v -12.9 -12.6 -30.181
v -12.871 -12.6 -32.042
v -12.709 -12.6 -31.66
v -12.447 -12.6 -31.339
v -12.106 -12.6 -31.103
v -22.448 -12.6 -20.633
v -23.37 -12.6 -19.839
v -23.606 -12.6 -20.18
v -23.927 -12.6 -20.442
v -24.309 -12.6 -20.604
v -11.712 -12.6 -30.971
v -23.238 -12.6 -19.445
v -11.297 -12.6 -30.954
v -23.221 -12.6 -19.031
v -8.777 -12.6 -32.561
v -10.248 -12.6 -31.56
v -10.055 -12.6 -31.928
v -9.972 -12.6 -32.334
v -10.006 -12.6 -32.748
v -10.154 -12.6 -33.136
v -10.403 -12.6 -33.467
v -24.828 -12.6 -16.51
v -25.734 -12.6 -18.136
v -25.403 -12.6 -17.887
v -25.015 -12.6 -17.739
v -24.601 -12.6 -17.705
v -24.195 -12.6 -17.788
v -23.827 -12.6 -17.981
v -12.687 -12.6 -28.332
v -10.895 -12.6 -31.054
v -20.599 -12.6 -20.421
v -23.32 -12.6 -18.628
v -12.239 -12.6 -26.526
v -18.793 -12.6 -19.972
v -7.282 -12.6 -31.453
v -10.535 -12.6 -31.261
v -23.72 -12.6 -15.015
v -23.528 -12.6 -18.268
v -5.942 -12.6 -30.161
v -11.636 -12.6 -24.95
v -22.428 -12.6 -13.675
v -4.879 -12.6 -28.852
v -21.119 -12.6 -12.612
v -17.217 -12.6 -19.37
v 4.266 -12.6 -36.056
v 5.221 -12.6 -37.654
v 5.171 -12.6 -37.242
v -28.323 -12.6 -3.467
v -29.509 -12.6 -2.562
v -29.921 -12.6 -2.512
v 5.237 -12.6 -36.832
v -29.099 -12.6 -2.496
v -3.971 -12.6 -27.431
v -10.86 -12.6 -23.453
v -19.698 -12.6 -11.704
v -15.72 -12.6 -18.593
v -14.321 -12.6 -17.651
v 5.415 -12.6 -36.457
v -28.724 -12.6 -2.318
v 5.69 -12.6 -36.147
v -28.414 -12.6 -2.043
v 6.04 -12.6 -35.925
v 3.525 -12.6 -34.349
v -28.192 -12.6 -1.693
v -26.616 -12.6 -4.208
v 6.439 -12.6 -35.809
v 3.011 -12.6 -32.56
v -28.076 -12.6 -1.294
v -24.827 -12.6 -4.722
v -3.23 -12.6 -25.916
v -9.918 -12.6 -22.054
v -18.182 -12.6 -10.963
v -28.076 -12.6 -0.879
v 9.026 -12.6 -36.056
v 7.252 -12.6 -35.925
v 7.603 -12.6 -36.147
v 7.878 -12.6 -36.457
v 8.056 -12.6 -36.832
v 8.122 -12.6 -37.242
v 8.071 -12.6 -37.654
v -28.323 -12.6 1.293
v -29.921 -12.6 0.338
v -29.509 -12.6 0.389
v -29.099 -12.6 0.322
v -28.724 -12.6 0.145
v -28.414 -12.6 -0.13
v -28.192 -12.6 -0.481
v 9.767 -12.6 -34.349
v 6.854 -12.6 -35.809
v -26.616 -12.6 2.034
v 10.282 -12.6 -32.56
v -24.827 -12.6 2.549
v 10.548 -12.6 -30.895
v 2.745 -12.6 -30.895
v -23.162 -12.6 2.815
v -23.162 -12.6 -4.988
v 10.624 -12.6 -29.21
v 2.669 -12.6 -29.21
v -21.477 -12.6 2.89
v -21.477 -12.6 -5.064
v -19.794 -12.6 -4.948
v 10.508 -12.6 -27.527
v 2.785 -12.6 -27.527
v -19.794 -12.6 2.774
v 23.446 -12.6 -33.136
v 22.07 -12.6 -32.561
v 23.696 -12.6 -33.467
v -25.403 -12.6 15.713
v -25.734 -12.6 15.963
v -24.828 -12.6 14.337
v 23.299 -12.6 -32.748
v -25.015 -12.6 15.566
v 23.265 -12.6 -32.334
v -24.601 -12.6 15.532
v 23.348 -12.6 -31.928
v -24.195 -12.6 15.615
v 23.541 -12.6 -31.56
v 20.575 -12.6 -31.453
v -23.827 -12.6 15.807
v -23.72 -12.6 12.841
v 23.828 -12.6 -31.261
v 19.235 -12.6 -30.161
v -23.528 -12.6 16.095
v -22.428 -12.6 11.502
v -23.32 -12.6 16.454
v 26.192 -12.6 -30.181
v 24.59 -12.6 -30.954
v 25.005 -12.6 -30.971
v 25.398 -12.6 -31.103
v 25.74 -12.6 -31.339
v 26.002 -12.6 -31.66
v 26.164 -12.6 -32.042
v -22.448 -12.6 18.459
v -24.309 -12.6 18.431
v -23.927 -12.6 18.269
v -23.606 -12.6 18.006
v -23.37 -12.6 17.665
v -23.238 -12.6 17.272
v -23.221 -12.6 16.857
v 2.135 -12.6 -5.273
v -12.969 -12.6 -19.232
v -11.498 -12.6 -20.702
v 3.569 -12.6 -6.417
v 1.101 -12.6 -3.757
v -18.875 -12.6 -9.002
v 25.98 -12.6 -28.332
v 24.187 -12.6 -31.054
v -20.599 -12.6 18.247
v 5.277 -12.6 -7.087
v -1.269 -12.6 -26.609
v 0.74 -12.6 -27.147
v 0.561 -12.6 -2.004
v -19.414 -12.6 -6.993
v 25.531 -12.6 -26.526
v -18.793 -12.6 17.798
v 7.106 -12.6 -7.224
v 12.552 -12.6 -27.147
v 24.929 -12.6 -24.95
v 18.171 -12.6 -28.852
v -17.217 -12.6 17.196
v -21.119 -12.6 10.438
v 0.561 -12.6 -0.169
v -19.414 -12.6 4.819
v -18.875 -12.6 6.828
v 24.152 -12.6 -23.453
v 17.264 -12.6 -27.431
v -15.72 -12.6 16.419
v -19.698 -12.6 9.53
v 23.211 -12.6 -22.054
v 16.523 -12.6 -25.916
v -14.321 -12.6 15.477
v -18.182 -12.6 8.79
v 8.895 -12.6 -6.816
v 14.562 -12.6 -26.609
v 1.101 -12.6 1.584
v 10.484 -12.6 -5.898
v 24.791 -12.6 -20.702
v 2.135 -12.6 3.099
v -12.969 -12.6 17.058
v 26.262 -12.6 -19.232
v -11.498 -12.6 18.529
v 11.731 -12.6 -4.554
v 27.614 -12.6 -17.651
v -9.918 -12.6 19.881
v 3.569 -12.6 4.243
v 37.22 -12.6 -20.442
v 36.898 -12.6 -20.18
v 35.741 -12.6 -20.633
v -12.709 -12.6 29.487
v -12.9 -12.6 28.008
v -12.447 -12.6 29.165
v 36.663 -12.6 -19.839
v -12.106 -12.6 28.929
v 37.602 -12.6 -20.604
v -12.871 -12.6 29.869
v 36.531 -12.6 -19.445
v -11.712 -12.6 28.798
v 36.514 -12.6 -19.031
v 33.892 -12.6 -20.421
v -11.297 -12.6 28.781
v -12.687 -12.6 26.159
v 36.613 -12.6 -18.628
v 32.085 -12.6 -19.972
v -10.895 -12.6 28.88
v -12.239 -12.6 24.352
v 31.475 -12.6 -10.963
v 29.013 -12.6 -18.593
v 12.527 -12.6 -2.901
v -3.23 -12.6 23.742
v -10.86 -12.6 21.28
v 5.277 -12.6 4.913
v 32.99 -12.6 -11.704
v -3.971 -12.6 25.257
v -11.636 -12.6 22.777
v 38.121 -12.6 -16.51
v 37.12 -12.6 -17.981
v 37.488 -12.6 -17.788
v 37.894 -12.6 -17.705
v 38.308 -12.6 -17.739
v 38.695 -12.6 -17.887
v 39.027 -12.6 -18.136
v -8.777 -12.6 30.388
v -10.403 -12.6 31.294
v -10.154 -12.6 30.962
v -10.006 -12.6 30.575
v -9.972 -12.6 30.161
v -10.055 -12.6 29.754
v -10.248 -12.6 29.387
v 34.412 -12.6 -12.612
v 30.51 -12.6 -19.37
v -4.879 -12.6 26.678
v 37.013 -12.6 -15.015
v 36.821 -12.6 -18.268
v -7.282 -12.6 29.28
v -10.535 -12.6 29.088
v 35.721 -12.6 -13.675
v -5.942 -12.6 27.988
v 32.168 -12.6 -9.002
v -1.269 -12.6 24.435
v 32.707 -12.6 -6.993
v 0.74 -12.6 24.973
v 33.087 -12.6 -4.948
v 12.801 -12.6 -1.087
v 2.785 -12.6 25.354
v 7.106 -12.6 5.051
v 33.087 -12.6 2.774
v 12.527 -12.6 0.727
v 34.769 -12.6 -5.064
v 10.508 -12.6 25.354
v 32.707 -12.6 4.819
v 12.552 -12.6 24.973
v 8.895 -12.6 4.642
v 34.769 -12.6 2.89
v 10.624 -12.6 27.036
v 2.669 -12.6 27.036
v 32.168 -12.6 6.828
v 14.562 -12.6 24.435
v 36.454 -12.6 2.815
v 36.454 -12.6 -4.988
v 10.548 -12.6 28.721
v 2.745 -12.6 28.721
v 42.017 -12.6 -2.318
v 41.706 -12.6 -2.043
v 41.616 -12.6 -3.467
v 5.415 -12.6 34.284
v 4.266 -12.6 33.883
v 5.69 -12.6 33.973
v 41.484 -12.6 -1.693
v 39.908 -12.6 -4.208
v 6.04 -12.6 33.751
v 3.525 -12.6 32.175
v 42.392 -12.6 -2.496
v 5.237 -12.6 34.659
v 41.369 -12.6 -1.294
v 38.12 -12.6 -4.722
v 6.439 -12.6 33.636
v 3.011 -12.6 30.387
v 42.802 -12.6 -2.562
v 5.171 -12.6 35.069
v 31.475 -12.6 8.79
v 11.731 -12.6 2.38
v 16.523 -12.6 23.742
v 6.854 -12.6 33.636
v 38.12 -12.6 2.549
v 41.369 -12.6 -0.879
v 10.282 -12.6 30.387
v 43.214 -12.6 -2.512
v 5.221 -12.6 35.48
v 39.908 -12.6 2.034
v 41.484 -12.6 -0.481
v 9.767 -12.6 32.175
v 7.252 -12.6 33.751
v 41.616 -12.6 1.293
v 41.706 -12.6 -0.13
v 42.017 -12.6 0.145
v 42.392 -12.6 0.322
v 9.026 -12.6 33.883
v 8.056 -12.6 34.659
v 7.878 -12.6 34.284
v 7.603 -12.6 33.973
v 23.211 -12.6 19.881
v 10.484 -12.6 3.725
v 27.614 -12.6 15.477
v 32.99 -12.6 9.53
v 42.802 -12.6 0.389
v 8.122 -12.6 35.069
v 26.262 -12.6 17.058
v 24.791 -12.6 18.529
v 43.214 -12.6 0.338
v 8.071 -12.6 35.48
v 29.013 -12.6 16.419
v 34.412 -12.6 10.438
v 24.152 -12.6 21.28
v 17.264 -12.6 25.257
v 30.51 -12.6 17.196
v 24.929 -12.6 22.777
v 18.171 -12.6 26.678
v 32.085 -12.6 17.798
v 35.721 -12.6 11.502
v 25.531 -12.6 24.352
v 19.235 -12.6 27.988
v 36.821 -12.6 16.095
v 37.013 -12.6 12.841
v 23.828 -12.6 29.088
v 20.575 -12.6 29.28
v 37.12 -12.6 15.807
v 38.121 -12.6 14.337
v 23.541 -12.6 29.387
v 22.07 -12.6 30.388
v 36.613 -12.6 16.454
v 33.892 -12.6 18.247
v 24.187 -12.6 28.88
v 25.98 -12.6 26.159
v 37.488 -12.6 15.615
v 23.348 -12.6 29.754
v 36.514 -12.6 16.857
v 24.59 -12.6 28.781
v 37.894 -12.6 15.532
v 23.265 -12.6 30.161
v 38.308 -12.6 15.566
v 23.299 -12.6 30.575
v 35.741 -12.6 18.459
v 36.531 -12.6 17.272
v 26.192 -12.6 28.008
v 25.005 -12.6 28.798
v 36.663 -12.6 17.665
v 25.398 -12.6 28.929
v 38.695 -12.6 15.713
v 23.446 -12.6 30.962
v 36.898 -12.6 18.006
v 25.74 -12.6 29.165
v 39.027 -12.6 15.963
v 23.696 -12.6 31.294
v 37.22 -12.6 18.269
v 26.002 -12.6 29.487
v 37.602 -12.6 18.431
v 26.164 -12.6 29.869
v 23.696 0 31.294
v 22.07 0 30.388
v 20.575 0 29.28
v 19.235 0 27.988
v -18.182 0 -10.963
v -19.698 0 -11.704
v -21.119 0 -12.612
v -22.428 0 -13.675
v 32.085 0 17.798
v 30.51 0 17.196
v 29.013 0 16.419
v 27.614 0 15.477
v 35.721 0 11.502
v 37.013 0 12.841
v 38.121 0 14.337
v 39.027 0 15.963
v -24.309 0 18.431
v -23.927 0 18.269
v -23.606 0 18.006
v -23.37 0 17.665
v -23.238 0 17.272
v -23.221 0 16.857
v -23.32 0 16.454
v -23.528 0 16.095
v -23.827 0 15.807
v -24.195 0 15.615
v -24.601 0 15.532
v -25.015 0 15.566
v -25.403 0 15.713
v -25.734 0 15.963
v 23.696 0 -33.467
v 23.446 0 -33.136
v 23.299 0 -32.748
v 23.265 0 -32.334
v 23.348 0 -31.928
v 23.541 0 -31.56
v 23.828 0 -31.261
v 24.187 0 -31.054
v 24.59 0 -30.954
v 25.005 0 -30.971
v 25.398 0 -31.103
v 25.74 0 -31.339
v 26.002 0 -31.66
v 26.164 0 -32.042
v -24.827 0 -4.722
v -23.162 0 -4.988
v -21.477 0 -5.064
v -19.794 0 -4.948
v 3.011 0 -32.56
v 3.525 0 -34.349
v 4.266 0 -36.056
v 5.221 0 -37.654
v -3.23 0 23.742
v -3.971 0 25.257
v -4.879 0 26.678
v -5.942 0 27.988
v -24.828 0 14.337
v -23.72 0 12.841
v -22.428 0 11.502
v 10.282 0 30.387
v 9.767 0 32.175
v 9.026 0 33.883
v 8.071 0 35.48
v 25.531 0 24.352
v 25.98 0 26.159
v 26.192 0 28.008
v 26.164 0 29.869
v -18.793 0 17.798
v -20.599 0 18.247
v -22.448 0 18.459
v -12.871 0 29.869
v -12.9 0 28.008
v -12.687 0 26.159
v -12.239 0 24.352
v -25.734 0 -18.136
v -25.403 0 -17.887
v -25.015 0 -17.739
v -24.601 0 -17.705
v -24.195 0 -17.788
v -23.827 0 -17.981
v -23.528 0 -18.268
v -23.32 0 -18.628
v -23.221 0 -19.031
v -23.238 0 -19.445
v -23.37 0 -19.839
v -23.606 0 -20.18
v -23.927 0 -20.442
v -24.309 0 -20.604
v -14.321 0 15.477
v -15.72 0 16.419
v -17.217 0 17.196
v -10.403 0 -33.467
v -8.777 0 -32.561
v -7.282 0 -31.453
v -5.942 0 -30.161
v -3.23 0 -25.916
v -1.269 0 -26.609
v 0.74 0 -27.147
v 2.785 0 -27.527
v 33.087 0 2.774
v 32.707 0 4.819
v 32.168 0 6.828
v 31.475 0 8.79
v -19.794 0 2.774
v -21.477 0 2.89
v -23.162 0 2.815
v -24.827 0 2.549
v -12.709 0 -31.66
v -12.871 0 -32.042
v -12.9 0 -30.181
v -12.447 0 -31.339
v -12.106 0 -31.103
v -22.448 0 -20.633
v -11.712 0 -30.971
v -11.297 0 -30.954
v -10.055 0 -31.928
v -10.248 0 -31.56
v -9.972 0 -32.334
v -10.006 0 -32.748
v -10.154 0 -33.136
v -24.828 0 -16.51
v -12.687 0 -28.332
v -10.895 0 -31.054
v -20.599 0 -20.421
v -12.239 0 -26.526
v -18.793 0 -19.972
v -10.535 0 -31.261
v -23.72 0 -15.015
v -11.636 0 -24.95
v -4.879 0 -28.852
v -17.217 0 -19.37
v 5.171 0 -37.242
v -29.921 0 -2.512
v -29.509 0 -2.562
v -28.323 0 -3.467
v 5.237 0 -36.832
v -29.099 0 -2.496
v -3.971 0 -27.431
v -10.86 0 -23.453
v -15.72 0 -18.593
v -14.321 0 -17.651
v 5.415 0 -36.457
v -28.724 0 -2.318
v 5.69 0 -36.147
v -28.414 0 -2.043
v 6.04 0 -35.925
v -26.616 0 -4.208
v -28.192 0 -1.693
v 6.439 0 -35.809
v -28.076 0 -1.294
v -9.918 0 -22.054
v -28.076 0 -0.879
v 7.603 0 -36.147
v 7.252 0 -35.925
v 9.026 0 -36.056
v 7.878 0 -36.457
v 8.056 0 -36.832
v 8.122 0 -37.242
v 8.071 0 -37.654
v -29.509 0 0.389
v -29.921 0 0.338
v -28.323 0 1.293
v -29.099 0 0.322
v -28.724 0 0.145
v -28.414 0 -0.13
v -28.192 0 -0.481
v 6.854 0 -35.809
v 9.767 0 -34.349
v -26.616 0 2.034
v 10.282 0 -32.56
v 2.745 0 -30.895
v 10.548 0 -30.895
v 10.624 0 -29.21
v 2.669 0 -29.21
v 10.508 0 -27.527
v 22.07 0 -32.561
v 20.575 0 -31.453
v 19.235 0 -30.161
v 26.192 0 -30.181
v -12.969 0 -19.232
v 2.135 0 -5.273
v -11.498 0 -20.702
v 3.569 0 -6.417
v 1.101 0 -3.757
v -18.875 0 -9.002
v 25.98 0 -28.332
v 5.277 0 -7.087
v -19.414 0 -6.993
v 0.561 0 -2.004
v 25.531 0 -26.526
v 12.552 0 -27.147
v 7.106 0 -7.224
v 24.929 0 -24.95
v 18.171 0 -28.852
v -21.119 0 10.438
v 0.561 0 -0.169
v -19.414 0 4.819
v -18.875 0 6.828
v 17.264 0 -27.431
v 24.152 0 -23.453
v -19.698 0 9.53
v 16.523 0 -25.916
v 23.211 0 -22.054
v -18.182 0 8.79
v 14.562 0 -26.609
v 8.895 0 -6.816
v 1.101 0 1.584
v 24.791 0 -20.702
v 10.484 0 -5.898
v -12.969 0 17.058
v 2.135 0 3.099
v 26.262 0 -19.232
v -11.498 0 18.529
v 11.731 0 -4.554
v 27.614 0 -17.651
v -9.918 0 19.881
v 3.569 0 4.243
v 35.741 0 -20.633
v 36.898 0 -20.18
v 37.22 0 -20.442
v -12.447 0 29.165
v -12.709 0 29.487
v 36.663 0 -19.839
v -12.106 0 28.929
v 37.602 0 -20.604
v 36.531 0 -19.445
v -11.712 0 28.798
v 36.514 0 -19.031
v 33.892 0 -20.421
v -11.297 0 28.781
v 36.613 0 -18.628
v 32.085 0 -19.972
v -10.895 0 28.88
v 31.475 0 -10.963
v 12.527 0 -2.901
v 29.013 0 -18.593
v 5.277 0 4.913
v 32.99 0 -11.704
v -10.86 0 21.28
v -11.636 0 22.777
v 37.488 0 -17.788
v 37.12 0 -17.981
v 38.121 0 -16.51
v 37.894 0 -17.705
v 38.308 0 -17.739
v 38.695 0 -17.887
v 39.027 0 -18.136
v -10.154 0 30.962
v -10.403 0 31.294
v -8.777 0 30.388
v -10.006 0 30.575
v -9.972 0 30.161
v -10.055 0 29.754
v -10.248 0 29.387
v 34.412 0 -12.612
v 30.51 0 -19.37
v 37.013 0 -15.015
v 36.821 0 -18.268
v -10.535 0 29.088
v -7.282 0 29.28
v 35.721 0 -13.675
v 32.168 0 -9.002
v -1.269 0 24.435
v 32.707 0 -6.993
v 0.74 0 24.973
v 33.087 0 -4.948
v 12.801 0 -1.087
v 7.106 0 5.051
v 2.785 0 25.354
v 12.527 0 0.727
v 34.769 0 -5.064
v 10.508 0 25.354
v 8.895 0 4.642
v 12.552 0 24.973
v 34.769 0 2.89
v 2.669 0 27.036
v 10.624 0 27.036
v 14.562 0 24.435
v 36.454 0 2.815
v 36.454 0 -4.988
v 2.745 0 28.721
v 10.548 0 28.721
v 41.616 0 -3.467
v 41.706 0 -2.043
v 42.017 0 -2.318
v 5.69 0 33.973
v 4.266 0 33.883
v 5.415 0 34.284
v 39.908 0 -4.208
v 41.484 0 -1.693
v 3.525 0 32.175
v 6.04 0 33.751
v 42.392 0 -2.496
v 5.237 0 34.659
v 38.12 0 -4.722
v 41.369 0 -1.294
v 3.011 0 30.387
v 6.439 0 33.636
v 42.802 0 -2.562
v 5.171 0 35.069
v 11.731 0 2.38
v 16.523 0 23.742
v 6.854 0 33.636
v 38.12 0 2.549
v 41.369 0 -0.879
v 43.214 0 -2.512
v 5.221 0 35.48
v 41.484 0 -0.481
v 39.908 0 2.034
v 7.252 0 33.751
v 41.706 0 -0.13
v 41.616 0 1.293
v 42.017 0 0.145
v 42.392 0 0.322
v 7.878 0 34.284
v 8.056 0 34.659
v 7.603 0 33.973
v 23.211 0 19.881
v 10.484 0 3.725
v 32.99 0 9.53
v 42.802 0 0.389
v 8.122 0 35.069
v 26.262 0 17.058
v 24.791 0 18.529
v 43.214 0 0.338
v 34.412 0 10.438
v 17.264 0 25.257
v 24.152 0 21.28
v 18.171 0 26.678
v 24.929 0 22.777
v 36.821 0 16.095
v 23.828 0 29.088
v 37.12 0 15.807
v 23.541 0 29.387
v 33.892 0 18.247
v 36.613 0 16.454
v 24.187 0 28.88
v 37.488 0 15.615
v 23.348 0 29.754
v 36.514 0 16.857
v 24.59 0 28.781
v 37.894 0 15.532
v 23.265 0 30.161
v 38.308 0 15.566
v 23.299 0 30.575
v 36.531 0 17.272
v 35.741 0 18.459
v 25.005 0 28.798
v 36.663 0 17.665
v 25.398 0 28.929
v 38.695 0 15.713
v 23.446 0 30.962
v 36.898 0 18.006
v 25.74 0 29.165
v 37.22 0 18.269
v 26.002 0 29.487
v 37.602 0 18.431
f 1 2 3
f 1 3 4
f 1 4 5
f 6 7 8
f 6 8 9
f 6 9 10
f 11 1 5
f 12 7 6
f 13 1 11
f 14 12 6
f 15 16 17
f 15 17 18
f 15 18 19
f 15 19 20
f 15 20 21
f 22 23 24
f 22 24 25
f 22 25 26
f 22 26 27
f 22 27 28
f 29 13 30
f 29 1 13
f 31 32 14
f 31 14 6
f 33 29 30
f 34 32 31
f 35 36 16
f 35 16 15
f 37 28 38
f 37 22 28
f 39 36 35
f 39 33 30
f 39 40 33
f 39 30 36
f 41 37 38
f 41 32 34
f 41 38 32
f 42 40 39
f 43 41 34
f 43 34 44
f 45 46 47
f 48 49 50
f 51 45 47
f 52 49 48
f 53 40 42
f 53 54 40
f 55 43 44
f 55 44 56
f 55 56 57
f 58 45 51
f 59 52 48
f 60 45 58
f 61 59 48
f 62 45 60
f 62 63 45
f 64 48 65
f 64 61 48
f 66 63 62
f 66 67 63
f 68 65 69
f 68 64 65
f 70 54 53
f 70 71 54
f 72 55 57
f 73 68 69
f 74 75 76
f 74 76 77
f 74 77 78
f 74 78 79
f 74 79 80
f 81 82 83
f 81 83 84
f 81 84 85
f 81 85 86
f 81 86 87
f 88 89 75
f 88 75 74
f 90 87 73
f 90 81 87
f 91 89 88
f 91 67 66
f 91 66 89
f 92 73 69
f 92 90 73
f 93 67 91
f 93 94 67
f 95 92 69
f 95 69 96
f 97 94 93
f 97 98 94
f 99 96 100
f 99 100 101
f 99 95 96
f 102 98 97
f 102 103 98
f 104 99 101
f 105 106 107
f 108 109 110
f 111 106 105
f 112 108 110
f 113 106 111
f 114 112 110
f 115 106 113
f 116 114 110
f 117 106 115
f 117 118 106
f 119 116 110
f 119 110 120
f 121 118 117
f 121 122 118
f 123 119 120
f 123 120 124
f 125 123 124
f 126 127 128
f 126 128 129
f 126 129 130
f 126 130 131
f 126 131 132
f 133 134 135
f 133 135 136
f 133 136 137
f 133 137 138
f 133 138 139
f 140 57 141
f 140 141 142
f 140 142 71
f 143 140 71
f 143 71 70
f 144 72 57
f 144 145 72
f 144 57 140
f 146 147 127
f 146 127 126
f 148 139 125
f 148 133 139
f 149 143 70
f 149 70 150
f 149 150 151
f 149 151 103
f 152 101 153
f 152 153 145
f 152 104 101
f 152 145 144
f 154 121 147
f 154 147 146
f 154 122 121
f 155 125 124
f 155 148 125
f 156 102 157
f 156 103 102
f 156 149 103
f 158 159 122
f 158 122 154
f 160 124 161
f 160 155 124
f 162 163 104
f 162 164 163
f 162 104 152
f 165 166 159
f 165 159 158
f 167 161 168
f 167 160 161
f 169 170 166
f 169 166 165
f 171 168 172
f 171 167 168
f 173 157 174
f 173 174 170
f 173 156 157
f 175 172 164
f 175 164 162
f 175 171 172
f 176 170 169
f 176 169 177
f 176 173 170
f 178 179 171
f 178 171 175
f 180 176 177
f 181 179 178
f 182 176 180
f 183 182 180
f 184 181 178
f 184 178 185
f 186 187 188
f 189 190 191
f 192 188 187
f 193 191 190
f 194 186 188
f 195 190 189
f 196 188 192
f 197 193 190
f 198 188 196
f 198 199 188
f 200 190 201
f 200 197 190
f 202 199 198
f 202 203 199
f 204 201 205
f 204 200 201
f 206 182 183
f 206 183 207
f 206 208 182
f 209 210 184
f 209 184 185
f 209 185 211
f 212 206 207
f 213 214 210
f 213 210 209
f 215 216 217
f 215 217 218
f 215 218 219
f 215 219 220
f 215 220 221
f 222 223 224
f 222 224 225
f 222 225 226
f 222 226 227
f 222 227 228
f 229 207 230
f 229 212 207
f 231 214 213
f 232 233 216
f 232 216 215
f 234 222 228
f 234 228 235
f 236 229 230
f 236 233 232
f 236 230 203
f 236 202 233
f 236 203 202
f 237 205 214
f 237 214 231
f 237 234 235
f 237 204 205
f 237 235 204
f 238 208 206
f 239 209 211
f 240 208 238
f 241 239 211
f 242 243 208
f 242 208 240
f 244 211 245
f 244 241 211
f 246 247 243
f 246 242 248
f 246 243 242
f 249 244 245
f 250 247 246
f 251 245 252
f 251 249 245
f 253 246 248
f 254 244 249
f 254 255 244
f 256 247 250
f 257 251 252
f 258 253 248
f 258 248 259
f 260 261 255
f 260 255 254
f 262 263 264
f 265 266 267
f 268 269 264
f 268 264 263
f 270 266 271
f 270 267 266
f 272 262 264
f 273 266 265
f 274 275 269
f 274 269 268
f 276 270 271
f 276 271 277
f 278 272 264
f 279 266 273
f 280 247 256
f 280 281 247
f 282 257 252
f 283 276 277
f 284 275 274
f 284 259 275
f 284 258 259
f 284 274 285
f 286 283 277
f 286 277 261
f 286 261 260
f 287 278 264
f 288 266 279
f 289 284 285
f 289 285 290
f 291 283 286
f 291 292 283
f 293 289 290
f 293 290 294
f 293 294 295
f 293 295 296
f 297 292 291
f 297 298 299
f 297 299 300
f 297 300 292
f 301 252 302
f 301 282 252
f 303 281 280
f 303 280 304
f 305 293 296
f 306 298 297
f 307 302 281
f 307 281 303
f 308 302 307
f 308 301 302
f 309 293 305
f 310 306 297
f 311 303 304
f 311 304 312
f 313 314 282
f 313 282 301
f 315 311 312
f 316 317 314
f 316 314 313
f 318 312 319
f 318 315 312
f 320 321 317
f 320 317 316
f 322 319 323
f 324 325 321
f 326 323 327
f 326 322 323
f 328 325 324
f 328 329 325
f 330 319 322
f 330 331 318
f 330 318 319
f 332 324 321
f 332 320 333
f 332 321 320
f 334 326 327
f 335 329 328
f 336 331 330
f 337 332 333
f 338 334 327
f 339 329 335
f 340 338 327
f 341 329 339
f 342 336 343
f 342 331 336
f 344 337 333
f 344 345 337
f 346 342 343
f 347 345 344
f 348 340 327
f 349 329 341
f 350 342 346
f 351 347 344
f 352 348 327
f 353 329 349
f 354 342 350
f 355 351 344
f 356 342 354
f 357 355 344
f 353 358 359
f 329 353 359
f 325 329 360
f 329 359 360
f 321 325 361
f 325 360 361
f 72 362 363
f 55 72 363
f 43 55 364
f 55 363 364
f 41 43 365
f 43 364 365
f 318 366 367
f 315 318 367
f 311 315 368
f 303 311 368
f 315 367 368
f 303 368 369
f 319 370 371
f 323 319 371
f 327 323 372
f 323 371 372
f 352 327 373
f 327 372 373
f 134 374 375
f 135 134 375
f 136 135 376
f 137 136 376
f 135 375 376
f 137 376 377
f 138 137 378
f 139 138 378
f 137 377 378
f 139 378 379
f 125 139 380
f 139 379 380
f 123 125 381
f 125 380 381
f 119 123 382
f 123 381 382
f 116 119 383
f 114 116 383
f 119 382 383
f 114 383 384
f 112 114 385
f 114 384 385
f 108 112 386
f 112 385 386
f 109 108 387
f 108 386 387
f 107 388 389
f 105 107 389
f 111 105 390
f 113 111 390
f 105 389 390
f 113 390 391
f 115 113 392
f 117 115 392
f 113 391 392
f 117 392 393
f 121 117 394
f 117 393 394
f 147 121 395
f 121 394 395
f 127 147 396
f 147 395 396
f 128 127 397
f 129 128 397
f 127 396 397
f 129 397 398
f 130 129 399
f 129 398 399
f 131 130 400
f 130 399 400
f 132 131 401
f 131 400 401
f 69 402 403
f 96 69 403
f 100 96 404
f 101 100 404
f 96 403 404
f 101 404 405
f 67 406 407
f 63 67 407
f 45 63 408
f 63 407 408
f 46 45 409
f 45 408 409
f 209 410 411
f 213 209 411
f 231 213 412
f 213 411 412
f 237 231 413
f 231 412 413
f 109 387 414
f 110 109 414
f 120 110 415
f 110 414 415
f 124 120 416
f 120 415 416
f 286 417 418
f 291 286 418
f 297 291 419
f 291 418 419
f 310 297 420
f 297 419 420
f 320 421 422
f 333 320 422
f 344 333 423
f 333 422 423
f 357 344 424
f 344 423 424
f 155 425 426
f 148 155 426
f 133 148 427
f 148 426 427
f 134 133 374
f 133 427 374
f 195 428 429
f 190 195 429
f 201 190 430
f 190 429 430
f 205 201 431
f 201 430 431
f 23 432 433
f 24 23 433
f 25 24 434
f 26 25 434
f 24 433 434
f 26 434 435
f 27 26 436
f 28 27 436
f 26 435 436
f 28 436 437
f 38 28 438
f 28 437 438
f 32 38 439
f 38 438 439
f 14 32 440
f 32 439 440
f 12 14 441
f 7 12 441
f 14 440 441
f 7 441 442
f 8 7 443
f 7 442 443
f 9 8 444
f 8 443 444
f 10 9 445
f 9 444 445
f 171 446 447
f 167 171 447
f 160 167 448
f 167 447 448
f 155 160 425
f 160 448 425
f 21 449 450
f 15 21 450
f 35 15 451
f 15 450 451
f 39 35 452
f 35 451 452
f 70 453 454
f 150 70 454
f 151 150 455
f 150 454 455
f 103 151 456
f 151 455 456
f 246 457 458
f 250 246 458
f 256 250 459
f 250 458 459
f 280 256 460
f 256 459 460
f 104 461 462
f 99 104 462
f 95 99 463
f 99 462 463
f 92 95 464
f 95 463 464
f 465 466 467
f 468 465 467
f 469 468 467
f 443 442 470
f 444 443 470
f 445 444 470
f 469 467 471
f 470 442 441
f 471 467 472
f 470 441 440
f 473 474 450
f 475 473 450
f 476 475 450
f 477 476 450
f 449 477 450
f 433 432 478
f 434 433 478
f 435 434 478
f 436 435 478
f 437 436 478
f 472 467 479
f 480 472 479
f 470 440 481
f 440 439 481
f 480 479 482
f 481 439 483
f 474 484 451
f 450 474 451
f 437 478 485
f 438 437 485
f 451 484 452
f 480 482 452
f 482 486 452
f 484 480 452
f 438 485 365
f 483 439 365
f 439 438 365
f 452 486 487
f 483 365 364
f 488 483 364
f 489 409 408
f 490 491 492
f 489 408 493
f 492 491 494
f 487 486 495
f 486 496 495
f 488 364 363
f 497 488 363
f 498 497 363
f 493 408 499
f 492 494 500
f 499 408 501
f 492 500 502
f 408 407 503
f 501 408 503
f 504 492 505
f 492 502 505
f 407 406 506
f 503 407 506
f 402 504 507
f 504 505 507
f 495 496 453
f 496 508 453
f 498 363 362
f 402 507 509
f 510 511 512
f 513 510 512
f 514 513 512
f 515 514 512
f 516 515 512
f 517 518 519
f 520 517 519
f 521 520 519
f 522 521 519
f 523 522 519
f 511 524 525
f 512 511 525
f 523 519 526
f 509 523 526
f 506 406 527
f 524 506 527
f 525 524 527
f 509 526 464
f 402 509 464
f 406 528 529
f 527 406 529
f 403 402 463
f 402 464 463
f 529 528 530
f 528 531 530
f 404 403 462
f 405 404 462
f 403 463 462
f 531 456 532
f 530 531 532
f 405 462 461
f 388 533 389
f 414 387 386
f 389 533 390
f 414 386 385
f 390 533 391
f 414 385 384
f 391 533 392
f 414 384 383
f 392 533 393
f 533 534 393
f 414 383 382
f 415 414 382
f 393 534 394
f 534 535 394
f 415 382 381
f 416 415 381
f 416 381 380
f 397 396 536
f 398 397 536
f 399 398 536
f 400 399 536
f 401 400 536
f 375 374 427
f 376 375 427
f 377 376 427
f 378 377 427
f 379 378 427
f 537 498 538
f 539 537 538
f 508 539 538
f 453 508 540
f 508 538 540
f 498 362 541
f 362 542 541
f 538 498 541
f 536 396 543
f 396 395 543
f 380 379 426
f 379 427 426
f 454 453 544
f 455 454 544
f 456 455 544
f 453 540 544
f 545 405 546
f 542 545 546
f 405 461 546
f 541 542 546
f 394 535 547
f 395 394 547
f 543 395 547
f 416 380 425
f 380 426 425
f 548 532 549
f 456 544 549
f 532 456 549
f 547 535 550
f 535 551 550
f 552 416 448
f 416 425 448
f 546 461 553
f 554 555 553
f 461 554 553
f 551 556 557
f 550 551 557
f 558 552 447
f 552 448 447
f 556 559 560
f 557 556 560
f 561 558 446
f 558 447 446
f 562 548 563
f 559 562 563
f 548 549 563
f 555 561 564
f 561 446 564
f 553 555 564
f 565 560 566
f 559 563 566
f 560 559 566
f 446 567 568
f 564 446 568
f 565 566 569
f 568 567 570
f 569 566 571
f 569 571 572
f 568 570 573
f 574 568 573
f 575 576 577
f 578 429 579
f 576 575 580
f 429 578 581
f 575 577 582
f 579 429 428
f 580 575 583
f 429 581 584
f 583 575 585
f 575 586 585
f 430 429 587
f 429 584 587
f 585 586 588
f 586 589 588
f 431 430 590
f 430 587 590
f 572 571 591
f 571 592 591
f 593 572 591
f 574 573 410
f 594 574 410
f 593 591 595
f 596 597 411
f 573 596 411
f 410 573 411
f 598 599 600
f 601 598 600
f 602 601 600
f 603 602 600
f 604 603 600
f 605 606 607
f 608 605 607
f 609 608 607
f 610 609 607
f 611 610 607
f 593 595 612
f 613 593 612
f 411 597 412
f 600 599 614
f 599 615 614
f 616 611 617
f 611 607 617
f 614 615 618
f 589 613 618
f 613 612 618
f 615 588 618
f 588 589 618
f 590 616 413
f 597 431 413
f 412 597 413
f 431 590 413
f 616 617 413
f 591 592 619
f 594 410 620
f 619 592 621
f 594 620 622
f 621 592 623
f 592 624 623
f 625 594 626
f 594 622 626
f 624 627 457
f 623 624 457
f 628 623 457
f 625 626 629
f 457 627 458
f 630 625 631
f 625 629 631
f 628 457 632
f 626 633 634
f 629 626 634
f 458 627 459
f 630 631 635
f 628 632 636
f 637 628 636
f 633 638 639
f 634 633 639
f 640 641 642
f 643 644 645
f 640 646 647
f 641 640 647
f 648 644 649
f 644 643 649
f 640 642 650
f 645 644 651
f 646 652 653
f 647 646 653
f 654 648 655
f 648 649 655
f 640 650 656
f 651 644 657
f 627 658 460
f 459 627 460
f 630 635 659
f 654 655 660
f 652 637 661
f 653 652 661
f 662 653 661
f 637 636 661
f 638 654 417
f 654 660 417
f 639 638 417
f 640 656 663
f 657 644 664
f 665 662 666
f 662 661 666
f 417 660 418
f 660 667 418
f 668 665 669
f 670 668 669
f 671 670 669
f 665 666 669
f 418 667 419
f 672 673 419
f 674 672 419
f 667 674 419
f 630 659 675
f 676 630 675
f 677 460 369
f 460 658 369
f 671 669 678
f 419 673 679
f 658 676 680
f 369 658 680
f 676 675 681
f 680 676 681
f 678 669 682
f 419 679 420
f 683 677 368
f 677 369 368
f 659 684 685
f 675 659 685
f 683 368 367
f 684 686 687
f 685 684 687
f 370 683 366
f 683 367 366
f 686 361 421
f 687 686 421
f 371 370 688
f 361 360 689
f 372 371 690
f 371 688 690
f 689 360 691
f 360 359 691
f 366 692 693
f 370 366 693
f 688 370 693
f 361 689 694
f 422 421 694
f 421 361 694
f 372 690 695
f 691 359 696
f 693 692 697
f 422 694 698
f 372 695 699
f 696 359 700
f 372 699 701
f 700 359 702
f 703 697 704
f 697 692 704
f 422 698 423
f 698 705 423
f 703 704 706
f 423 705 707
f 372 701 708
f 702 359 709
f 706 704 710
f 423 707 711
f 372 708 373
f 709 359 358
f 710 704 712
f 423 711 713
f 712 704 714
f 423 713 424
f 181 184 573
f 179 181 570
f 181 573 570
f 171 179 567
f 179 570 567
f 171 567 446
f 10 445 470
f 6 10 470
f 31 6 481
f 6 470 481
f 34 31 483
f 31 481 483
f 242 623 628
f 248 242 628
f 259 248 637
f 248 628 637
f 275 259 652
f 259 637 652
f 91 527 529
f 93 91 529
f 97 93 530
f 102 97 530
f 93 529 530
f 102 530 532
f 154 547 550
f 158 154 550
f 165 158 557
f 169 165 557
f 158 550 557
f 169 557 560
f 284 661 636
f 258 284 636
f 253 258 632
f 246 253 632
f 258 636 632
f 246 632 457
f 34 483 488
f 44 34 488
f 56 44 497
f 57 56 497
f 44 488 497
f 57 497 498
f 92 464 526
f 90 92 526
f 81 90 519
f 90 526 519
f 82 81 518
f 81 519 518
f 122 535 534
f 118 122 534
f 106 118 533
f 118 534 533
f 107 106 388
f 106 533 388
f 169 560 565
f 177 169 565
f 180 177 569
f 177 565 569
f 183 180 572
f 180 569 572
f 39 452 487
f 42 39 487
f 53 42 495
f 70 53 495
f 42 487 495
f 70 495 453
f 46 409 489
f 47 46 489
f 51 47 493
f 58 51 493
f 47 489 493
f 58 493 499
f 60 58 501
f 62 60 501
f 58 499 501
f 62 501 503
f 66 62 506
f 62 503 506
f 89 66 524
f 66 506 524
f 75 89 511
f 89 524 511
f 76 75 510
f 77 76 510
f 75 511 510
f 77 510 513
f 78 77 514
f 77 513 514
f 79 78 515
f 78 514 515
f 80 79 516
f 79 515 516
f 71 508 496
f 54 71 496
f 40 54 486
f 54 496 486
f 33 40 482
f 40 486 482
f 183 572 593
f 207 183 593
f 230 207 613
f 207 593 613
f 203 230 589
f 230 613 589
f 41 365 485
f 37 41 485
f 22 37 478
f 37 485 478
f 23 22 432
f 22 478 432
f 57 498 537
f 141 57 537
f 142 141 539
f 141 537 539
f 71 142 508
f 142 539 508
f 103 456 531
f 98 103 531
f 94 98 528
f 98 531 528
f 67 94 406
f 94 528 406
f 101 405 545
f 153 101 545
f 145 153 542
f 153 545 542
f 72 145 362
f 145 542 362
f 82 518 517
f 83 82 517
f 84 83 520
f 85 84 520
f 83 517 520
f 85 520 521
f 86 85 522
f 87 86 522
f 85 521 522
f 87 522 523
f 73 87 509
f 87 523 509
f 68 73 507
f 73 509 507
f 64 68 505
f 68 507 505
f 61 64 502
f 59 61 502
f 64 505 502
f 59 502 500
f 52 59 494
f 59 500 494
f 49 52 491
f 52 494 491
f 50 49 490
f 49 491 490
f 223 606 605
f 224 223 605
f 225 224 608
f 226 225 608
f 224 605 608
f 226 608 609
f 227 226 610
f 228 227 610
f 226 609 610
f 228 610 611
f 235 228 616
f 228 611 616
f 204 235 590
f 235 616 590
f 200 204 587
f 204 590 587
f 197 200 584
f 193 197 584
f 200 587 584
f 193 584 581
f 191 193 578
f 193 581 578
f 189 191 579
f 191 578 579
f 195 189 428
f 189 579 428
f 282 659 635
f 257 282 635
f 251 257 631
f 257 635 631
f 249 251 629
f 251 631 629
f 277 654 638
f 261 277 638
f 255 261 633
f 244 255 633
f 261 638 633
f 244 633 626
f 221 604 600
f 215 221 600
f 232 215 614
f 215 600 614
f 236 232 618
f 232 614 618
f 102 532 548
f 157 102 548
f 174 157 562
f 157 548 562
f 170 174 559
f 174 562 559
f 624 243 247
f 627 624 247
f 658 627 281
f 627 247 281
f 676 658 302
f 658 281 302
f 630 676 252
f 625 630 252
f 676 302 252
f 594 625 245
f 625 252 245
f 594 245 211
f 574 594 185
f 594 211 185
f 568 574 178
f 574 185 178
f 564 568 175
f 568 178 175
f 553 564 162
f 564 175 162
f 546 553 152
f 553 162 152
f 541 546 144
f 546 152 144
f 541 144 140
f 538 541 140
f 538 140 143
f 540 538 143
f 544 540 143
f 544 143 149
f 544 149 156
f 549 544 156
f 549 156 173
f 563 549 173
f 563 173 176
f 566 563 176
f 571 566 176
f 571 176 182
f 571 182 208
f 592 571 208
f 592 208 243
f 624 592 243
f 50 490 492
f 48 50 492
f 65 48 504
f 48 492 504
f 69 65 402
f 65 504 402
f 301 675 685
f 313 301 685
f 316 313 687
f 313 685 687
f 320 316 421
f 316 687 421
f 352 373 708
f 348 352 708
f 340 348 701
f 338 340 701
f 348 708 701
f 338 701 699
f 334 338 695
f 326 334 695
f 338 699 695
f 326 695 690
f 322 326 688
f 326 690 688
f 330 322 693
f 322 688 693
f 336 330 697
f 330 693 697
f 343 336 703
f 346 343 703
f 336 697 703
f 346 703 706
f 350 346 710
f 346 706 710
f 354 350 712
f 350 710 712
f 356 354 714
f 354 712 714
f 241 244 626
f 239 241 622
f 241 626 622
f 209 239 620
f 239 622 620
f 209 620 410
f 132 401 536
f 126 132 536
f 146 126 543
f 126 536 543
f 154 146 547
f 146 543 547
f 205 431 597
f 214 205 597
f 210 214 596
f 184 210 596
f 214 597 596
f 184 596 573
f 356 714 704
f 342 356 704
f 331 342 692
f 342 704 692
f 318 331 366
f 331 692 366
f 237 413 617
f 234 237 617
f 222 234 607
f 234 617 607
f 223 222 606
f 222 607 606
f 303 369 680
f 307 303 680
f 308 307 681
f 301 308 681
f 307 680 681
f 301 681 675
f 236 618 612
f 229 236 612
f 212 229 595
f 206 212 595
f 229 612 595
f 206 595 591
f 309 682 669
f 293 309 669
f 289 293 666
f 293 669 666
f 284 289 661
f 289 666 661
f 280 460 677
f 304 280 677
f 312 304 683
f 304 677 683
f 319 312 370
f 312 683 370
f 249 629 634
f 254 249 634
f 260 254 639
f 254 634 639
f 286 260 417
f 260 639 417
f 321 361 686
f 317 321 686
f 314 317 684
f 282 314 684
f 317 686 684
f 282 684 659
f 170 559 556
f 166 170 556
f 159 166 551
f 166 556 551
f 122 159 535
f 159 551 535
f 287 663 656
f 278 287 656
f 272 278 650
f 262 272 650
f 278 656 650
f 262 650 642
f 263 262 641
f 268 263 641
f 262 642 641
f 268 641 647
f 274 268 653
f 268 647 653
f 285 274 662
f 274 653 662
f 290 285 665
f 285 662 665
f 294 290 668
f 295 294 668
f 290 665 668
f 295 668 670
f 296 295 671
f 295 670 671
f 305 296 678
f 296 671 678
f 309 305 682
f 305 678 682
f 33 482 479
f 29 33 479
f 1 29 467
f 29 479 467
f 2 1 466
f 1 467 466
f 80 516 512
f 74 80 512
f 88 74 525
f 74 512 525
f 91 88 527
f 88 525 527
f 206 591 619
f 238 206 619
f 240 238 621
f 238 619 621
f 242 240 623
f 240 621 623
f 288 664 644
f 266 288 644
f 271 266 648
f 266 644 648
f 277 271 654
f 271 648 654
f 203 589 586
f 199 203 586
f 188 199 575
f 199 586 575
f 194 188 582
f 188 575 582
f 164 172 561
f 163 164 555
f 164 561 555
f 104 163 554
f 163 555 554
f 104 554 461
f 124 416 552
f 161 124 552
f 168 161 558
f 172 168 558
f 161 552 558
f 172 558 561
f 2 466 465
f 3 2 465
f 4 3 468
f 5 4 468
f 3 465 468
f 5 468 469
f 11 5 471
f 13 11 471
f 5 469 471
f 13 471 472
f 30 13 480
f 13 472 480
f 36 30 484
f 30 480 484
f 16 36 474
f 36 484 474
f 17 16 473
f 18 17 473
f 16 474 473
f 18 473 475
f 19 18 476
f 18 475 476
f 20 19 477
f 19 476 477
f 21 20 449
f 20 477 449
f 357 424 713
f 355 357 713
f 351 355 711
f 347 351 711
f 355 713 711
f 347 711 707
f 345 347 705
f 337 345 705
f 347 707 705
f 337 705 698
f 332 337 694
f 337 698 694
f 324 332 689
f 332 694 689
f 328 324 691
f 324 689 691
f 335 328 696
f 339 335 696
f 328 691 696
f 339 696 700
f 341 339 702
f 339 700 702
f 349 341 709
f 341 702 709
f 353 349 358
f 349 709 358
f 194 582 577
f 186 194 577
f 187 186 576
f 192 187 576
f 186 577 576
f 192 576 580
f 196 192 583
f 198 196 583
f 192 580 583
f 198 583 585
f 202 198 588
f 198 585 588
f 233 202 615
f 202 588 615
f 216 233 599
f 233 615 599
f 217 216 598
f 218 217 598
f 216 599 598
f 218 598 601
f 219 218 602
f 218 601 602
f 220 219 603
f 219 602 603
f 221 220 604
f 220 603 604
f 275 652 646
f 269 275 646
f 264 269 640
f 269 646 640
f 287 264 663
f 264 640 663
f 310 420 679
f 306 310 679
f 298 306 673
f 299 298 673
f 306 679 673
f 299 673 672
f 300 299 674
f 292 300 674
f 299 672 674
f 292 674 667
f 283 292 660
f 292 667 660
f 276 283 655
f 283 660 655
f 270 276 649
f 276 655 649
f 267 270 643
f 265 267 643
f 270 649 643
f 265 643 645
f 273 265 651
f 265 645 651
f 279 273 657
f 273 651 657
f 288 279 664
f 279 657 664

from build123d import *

# Parameters (mm, degrees)
F1_DEPTH = 12.6
F2_COUNT = 12
F3_R     = 6.1544610685
F4_DEPTH = 25


with BuildPart() as f1:
    # F0 (on Front) → F1 (new body)
    with BuildSketch(Plane.XZ):
        with BuildLine():
            ThreePointArc((2.7852032442, 25.3538235305), (-10.8298302985, -21.3004259569), (33.3673953593, -1.0867331287))
            ThreePointArc((33.3673953593, -1.0867331287), (26.8600881876, 16.3894925292), (10.5075874745, 25.3538235305))
            ThreePointArc((10.5075874745, 25.3538235305), (8.9226743944, 25.5371357629), (7.3296460588, 25.6255301502))
            ThreePointArc((7.3296460588, 25.6255301502), (5.0516276545, 25.5866348058), (2.7852032442, 25.3538235305))
        make_face()
        with BuildLine():
            ThreePointArc((7.3296460588, 25.6255301502), (8.9226743944, 25.5371357629), (10.5075874745, 25.3538235305))
            ThreePointArc((10.5075874745, 25.3538235305), (10.6097622585, 27.8798441888), (10.28181369, 30.3865691018))
            ThreePointArc((10.28181369, 30.3865691018), (9.4245102455, 33.0410725411), (8.0713397316, 35.4803936077))
            ThreePointArc((8.0713397316, 35.4803936077), (6.6463953593, 33.6211668014), (5.2214509871, 35.4803936077))
            ThreePointArc((5.2214509871, 35.4803936077), (3.8682804732, 33.0410725411), (3.0109770287, 30.3865691018))
            ThreePointArc((3.0109770287, 30.3865691018), (2.6830284602, 27.8798441888), (2.7852032442, 25.3538235305))
            ThreePointArc((2.7852032442, 25.3538235305), (5.0516276545, 25.5866348058), (7.3296460588, 25.6255301502))
        make_face()
    extrude(amount=F1_DEPTH)

    # F2: F1 ×12 about axis
    f2_axis = Axis((6.6463953593, 0, -1.0867331287), (0, 1, 0))


with BuildPart() as f1_1:
    add(f1.part)
    for i in range(1, F2_COUNT):
        add(f1.part.rotate(f2_axis, i * 360 / F2_COUNT))

    # F3 (on face) → F4 (cut)
    with BuildSketch(Plane.XZ.offset(12.6)):
        with Locations((6.6463953593, -1.0867331287)):
            Circle(F3_R)
    extrude(amount=-F4_DEPTH, mode=Mode.SUBTRACT)


solid = f1_1.part
